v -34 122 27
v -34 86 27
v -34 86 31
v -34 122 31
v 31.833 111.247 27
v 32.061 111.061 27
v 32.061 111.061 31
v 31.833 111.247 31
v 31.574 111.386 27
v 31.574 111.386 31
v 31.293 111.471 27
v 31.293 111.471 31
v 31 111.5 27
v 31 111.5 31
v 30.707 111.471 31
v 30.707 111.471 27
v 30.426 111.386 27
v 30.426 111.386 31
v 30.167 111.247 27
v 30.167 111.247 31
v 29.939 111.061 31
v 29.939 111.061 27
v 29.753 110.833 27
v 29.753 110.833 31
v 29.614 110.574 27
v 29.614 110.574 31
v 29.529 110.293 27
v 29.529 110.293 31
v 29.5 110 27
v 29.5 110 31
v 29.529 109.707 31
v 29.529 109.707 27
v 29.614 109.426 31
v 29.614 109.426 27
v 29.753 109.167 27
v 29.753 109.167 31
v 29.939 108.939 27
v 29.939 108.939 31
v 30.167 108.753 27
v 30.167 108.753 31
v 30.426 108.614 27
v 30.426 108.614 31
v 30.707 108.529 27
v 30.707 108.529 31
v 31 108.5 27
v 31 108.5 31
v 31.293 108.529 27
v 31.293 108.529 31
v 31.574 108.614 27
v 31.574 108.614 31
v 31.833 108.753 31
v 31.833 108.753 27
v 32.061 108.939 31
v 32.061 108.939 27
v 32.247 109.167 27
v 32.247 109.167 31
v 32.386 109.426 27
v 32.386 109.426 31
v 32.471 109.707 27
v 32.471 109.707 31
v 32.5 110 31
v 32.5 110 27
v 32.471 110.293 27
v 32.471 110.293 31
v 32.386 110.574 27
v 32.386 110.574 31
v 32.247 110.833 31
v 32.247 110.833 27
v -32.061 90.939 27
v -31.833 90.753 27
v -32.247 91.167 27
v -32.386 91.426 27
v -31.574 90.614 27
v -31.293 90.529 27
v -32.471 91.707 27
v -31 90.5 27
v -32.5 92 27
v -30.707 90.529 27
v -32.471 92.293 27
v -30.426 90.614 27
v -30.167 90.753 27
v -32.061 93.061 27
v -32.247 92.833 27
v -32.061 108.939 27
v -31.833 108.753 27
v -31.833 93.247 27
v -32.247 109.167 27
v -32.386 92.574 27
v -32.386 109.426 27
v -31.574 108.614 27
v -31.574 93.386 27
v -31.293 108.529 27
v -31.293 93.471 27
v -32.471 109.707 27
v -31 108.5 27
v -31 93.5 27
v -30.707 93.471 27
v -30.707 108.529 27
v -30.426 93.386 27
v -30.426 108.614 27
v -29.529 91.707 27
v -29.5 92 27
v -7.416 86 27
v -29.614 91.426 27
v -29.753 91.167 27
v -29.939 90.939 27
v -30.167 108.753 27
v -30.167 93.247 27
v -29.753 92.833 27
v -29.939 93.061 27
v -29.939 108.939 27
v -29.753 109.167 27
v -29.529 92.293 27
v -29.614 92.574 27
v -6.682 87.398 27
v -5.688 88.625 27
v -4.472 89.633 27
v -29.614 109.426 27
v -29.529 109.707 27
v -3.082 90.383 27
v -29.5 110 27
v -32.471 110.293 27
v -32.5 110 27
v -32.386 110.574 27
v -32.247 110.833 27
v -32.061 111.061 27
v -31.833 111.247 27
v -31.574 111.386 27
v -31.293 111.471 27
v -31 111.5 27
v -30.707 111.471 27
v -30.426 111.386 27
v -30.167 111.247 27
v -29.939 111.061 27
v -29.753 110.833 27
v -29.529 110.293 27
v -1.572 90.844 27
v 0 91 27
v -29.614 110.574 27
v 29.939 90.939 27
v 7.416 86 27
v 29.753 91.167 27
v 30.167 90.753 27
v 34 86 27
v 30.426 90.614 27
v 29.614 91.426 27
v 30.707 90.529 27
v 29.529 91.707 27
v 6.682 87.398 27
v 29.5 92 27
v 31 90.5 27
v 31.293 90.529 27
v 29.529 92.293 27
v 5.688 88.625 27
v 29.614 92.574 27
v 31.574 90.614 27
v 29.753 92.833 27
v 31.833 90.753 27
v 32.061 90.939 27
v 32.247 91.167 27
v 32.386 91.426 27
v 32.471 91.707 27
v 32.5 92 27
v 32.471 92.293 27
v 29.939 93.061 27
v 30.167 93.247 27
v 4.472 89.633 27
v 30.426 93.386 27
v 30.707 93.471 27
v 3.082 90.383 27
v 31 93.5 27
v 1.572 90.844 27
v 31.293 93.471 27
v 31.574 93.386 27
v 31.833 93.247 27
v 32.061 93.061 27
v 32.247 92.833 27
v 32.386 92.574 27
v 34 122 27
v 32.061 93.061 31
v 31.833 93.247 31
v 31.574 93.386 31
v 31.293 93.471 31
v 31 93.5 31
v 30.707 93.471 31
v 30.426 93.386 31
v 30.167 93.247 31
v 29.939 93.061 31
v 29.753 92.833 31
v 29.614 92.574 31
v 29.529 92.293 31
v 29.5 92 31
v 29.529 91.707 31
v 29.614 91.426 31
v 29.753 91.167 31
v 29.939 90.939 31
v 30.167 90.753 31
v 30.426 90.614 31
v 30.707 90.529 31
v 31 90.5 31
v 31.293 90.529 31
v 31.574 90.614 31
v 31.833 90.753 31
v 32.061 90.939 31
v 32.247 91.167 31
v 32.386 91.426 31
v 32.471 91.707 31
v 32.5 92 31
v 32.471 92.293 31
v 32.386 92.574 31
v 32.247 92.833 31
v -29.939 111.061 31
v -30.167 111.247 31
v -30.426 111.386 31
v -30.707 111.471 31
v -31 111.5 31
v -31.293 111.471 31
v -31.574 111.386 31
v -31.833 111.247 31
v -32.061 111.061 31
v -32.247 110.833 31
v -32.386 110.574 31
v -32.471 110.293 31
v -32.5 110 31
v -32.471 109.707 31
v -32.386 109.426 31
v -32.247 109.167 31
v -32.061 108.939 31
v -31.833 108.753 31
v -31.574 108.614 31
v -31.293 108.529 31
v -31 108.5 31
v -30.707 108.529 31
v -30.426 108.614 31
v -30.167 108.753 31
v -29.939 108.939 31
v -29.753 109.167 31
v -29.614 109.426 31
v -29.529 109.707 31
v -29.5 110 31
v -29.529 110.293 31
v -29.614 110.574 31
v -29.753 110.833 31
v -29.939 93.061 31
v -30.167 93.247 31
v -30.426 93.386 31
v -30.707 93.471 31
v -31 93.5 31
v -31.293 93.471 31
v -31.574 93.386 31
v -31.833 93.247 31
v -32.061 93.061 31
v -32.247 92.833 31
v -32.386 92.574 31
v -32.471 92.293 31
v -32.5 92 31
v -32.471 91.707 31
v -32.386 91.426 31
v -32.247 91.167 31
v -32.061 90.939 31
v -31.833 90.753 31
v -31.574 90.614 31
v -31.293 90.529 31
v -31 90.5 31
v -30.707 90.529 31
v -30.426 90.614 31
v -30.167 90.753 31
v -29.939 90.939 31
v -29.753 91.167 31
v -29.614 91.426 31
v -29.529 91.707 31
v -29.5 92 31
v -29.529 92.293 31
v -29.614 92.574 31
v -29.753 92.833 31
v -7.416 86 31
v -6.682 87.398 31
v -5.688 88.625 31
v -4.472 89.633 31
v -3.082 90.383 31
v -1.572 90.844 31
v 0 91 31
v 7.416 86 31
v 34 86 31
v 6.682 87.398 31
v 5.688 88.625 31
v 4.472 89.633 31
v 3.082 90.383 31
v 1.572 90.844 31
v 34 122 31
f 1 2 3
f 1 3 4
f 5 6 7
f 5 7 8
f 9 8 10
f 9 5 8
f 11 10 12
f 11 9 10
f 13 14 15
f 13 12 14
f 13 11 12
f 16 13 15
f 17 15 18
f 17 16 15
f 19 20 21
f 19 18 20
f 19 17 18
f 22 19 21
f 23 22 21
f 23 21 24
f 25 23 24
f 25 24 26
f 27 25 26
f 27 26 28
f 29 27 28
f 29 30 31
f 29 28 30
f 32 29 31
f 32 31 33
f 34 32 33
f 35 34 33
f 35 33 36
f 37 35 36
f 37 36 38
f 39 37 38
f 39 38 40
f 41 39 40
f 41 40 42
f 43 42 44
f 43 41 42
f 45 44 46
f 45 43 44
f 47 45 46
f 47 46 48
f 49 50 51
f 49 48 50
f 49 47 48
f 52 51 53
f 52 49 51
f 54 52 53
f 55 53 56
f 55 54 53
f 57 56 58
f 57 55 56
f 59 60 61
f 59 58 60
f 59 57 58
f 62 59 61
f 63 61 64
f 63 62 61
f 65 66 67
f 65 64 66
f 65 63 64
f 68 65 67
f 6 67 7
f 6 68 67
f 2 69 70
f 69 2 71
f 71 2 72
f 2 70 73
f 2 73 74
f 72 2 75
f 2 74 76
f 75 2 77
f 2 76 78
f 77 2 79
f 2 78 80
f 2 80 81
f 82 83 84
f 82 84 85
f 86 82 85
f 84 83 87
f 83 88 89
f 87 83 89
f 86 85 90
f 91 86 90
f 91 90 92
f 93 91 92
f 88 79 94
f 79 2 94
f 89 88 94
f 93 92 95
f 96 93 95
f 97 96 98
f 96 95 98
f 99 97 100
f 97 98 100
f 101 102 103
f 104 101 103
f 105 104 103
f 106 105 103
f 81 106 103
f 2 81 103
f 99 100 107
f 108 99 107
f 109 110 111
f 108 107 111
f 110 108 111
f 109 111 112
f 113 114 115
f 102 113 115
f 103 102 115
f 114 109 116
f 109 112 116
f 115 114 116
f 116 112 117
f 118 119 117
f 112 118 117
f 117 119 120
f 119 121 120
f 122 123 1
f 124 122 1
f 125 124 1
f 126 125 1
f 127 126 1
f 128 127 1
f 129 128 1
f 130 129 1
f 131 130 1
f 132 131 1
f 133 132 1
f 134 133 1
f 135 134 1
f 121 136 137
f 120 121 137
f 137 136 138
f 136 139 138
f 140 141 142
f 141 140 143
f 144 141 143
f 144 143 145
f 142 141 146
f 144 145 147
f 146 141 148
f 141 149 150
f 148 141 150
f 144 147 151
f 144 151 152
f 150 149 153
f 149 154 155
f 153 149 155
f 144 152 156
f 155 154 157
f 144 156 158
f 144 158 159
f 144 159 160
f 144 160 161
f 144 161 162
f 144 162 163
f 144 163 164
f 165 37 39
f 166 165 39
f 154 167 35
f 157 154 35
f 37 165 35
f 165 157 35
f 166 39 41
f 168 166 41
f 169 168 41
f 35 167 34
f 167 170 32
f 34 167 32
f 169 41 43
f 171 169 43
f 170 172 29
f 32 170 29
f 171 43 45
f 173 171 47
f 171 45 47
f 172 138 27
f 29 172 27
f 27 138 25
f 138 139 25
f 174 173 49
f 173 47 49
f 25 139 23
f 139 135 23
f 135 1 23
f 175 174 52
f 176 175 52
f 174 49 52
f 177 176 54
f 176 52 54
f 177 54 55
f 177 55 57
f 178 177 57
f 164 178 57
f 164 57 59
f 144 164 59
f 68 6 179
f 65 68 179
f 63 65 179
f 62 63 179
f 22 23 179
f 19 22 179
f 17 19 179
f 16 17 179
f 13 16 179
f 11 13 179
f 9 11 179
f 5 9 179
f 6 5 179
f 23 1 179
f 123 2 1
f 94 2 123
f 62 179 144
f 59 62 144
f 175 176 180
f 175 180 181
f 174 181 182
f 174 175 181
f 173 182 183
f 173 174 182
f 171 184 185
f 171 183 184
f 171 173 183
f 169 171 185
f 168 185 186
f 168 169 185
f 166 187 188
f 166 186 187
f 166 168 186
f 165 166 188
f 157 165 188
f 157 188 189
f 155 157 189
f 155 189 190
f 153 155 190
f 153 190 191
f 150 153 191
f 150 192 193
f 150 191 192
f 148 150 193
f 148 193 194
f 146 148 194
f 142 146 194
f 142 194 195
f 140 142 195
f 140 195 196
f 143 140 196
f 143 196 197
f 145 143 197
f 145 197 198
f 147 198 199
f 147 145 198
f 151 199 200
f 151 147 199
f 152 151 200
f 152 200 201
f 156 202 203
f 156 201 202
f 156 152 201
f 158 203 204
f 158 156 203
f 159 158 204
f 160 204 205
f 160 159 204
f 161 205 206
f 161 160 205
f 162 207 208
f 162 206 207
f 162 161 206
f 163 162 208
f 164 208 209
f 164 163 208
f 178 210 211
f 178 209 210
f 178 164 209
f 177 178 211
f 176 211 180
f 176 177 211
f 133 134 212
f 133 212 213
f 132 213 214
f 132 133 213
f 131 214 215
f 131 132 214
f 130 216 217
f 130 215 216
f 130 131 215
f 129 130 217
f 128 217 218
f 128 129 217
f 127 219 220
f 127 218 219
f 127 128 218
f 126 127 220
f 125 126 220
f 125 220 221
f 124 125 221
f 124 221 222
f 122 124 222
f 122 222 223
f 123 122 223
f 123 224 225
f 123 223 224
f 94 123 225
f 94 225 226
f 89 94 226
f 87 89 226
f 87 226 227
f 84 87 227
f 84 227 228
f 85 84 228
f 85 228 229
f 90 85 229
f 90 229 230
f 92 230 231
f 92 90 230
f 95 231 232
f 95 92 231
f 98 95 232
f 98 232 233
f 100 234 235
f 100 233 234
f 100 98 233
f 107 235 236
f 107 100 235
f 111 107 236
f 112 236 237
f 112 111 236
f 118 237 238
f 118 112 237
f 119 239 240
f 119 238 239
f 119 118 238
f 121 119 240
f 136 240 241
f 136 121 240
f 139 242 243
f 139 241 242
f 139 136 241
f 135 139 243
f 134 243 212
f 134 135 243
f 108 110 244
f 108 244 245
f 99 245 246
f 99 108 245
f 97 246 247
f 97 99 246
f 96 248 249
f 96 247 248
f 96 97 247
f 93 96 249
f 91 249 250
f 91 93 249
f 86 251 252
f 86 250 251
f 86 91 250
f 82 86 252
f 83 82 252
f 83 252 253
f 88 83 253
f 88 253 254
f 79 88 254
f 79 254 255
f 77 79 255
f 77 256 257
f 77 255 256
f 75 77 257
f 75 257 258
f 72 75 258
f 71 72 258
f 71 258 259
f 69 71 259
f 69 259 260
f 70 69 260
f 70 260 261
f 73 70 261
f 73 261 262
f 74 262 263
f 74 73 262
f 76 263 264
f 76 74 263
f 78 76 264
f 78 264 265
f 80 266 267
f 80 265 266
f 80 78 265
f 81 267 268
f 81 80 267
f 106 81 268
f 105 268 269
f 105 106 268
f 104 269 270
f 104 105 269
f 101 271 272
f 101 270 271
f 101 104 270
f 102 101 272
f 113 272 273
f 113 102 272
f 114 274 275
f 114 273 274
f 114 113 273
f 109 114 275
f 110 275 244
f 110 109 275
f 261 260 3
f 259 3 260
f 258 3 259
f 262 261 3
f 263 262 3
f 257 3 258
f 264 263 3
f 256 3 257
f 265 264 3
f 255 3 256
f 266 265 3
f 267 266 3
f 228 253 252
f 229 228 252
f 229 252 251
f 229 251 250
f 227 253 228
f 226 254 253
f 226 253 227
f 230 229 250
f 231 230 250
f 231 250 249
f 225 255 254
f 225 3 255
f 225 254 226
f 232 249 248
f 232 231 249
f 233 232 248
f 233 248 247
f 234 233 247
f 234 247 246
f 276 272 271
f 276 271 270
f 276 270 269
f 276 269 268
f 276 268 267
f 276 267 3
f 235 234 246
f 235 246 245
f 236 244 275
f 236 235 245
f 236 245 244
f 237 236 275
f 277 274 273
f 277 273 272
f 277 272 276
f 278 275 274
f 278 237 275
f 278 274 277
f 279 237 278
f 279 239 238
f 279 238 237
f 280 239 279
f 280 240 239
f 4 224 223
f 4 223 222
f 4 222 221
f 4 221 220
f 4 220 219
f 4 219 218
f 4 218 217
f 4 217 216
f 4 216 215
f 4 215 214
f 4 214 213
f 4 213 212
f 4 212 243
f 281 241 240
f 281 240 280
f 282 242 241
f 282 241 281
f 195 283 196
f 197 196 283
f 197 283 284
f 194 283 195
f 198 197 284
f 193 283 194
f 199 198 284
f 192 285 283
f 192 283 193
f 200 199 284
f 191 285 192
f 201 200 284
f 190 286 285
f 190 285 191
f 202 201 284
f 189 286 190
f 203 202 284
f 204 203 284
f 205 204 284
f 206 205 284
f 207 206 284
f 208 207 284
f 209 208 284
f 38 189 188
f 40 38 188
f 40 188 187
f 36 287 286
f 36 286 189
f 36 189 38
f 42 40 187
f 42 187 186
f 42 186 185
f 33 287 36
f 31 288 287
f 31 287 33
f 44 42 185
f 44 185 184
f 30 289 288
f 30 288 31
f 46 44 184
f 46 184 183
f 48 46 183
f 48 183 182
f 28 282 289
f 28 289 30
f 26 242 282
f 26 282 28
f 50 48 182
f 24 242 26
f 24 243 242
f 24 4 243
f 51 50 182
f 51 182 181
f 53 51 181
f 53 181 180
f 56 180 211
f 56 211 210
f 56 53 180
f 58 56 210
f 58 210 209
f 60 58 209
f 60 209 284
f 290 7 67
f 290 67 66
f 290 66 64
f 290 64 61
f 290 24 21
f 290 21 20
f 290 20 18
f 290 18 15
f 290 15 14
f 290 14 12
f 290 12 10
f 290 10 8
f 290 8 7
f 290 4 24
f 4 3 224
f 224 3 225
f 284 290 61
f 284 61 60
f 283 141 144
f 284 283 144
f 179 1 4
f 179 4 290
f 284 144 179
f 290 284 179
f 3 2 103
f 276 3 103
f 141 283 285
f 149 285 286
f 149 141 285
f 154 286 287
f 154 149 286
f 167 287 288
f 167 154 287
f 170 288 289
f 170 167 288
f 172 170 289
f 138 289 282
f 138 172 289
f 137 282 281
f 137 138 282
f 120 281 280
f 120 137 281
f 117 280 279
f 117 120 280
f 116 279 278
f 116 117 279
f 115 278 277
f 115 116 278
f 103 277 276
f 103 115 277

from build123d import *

# Parameters (mm, degrees)
CYLINDER682_R               = 8
CYLINDER682_DEPTH           = 6
CYLINDER669_R               = 1.5
CYLINDER669_DEPTH           = 50
CYLINDER669_PLACEMENT_ANGLE = 45
CYLINDER672_R               = 1.5
CYLINDER672_DEPTH           = 50
CYLINDER672_PLACEMENT_ANGLE = 45
CYLINDER680_R               = 1.5
CYLINDER680_DEPTH           = 50
CYLINDER680_PLACEMENT_ANGLE = 45
CYLINDER673_R               = 1.5
CYLINDER673_DEPTH           = 50
CYLINDER673_PLACEMENT_ANGLE = 45
BOX249_W                    = 68
BOX249_H                    = 36
BOX249_DEPTH                = 4


with BuildPart() as v_lec682:
    # Cylinder682 → Cylinder682 (new body)
    with BuildSketch(Plane(origin=(0, 83, 25), x_dir=(1, 0, 0), z_dir=(0, 0, 1))):
        Circle(CYLINDER682_R)
    extrude(amount=CYLINDER682_DEPTH)


with BuildPart() as v_lec669:
    # Cylinder669 → Cylinder669 (new body)
    with BuildSketch(Plane.XY):
        Circle(CYLINDER669_R)
    extrude(amount=CYLINDER669_DEPTH)


with BuildPart() as v_lec669_1:
    # Cylinder669 placement: moved
    add(v_lec669.part.moved(Location((-31, 92, 0))).rotate(Axis((-31, 92, 0), (0, 0, 1)), CYLINDER669_PLACEMENT_ANGLE))


with BuildPart() as v_lec672:
    # Cylinder672 → Cylinder672 (new body)
    with BuildSketch(Plane.XY):
        Circle(CYLINDER672_R)
    extrude(amount=CYLINDER672_DEPTH)


with BuildPart() as v_lec672_1:
    # Cylinder672 placement: moved
    add(v_lec672.part.moved(Location((31, 110, 0))).rotate(Axis((31, 110, 0), (0, 0, 1)), CYLINDER672_PLACEMENT_ANGLE))


with BuildPart() as v_lec680:
    # Cylinder680 → Cylinder680 (new body)
    with BuildSketch(Plane.XY):
        Circle(CYLINDER680_R)
    extrude(amount=CYLINDER680_DEPTH)


with BuildPart() as v_lec680_1:
    # Cylinder680 placement: moved
    add(v_lec680.part.moved(Location((31, 92, 0))).rotate(Axis((31, 92, 0), (0, 0, 1)), CYLINDER680_PLACEMENT_ANGLE))


with BuildPart() as compound397:
    # Cylinder673 → Cylinder673 (new body)
    with BuildSketch(Plane.XY):
        Circle(CYLINDER673_R)
    extrude(amount=CYLINDER673_DEPTH)


with BuildPart() as compound397_1:
    # Cylinder673 placement: moved
    add(compound397.part.moved(Location((-31, 110, 0))).rotate(Axis((-31, 110, 0), (0, 0, 1)), CYLINDER673_PLACEMENT_ANGLE))

    # Compound397: union Válec669, Válec672, Válec680
    add(v_lec669_1.part)
    add(v_lec672_1.part)
    add(v_lec680_1.part)


with BuildPart() as cut266:
    # Box249 → Box249 (new body)
    with BuildSketch(Plane(origin=(-34, 86, 27), x_dir=(1, 0, 0), z_dir=(0, 0, 1))):
        with Locations((34, 18)):
            Rectangle(BOX249_W, BOX249_H)
    extrude(amount=BOX249_DEPTH)

    # Cut276: cut Compound397
    add(compound397_1.part, mode=Mode.SUBTRACT)

    # Cut266: cut Válec682
    add(v_lec682.part, mode=Mode.SUBTRACT)


solid = cut266.part
